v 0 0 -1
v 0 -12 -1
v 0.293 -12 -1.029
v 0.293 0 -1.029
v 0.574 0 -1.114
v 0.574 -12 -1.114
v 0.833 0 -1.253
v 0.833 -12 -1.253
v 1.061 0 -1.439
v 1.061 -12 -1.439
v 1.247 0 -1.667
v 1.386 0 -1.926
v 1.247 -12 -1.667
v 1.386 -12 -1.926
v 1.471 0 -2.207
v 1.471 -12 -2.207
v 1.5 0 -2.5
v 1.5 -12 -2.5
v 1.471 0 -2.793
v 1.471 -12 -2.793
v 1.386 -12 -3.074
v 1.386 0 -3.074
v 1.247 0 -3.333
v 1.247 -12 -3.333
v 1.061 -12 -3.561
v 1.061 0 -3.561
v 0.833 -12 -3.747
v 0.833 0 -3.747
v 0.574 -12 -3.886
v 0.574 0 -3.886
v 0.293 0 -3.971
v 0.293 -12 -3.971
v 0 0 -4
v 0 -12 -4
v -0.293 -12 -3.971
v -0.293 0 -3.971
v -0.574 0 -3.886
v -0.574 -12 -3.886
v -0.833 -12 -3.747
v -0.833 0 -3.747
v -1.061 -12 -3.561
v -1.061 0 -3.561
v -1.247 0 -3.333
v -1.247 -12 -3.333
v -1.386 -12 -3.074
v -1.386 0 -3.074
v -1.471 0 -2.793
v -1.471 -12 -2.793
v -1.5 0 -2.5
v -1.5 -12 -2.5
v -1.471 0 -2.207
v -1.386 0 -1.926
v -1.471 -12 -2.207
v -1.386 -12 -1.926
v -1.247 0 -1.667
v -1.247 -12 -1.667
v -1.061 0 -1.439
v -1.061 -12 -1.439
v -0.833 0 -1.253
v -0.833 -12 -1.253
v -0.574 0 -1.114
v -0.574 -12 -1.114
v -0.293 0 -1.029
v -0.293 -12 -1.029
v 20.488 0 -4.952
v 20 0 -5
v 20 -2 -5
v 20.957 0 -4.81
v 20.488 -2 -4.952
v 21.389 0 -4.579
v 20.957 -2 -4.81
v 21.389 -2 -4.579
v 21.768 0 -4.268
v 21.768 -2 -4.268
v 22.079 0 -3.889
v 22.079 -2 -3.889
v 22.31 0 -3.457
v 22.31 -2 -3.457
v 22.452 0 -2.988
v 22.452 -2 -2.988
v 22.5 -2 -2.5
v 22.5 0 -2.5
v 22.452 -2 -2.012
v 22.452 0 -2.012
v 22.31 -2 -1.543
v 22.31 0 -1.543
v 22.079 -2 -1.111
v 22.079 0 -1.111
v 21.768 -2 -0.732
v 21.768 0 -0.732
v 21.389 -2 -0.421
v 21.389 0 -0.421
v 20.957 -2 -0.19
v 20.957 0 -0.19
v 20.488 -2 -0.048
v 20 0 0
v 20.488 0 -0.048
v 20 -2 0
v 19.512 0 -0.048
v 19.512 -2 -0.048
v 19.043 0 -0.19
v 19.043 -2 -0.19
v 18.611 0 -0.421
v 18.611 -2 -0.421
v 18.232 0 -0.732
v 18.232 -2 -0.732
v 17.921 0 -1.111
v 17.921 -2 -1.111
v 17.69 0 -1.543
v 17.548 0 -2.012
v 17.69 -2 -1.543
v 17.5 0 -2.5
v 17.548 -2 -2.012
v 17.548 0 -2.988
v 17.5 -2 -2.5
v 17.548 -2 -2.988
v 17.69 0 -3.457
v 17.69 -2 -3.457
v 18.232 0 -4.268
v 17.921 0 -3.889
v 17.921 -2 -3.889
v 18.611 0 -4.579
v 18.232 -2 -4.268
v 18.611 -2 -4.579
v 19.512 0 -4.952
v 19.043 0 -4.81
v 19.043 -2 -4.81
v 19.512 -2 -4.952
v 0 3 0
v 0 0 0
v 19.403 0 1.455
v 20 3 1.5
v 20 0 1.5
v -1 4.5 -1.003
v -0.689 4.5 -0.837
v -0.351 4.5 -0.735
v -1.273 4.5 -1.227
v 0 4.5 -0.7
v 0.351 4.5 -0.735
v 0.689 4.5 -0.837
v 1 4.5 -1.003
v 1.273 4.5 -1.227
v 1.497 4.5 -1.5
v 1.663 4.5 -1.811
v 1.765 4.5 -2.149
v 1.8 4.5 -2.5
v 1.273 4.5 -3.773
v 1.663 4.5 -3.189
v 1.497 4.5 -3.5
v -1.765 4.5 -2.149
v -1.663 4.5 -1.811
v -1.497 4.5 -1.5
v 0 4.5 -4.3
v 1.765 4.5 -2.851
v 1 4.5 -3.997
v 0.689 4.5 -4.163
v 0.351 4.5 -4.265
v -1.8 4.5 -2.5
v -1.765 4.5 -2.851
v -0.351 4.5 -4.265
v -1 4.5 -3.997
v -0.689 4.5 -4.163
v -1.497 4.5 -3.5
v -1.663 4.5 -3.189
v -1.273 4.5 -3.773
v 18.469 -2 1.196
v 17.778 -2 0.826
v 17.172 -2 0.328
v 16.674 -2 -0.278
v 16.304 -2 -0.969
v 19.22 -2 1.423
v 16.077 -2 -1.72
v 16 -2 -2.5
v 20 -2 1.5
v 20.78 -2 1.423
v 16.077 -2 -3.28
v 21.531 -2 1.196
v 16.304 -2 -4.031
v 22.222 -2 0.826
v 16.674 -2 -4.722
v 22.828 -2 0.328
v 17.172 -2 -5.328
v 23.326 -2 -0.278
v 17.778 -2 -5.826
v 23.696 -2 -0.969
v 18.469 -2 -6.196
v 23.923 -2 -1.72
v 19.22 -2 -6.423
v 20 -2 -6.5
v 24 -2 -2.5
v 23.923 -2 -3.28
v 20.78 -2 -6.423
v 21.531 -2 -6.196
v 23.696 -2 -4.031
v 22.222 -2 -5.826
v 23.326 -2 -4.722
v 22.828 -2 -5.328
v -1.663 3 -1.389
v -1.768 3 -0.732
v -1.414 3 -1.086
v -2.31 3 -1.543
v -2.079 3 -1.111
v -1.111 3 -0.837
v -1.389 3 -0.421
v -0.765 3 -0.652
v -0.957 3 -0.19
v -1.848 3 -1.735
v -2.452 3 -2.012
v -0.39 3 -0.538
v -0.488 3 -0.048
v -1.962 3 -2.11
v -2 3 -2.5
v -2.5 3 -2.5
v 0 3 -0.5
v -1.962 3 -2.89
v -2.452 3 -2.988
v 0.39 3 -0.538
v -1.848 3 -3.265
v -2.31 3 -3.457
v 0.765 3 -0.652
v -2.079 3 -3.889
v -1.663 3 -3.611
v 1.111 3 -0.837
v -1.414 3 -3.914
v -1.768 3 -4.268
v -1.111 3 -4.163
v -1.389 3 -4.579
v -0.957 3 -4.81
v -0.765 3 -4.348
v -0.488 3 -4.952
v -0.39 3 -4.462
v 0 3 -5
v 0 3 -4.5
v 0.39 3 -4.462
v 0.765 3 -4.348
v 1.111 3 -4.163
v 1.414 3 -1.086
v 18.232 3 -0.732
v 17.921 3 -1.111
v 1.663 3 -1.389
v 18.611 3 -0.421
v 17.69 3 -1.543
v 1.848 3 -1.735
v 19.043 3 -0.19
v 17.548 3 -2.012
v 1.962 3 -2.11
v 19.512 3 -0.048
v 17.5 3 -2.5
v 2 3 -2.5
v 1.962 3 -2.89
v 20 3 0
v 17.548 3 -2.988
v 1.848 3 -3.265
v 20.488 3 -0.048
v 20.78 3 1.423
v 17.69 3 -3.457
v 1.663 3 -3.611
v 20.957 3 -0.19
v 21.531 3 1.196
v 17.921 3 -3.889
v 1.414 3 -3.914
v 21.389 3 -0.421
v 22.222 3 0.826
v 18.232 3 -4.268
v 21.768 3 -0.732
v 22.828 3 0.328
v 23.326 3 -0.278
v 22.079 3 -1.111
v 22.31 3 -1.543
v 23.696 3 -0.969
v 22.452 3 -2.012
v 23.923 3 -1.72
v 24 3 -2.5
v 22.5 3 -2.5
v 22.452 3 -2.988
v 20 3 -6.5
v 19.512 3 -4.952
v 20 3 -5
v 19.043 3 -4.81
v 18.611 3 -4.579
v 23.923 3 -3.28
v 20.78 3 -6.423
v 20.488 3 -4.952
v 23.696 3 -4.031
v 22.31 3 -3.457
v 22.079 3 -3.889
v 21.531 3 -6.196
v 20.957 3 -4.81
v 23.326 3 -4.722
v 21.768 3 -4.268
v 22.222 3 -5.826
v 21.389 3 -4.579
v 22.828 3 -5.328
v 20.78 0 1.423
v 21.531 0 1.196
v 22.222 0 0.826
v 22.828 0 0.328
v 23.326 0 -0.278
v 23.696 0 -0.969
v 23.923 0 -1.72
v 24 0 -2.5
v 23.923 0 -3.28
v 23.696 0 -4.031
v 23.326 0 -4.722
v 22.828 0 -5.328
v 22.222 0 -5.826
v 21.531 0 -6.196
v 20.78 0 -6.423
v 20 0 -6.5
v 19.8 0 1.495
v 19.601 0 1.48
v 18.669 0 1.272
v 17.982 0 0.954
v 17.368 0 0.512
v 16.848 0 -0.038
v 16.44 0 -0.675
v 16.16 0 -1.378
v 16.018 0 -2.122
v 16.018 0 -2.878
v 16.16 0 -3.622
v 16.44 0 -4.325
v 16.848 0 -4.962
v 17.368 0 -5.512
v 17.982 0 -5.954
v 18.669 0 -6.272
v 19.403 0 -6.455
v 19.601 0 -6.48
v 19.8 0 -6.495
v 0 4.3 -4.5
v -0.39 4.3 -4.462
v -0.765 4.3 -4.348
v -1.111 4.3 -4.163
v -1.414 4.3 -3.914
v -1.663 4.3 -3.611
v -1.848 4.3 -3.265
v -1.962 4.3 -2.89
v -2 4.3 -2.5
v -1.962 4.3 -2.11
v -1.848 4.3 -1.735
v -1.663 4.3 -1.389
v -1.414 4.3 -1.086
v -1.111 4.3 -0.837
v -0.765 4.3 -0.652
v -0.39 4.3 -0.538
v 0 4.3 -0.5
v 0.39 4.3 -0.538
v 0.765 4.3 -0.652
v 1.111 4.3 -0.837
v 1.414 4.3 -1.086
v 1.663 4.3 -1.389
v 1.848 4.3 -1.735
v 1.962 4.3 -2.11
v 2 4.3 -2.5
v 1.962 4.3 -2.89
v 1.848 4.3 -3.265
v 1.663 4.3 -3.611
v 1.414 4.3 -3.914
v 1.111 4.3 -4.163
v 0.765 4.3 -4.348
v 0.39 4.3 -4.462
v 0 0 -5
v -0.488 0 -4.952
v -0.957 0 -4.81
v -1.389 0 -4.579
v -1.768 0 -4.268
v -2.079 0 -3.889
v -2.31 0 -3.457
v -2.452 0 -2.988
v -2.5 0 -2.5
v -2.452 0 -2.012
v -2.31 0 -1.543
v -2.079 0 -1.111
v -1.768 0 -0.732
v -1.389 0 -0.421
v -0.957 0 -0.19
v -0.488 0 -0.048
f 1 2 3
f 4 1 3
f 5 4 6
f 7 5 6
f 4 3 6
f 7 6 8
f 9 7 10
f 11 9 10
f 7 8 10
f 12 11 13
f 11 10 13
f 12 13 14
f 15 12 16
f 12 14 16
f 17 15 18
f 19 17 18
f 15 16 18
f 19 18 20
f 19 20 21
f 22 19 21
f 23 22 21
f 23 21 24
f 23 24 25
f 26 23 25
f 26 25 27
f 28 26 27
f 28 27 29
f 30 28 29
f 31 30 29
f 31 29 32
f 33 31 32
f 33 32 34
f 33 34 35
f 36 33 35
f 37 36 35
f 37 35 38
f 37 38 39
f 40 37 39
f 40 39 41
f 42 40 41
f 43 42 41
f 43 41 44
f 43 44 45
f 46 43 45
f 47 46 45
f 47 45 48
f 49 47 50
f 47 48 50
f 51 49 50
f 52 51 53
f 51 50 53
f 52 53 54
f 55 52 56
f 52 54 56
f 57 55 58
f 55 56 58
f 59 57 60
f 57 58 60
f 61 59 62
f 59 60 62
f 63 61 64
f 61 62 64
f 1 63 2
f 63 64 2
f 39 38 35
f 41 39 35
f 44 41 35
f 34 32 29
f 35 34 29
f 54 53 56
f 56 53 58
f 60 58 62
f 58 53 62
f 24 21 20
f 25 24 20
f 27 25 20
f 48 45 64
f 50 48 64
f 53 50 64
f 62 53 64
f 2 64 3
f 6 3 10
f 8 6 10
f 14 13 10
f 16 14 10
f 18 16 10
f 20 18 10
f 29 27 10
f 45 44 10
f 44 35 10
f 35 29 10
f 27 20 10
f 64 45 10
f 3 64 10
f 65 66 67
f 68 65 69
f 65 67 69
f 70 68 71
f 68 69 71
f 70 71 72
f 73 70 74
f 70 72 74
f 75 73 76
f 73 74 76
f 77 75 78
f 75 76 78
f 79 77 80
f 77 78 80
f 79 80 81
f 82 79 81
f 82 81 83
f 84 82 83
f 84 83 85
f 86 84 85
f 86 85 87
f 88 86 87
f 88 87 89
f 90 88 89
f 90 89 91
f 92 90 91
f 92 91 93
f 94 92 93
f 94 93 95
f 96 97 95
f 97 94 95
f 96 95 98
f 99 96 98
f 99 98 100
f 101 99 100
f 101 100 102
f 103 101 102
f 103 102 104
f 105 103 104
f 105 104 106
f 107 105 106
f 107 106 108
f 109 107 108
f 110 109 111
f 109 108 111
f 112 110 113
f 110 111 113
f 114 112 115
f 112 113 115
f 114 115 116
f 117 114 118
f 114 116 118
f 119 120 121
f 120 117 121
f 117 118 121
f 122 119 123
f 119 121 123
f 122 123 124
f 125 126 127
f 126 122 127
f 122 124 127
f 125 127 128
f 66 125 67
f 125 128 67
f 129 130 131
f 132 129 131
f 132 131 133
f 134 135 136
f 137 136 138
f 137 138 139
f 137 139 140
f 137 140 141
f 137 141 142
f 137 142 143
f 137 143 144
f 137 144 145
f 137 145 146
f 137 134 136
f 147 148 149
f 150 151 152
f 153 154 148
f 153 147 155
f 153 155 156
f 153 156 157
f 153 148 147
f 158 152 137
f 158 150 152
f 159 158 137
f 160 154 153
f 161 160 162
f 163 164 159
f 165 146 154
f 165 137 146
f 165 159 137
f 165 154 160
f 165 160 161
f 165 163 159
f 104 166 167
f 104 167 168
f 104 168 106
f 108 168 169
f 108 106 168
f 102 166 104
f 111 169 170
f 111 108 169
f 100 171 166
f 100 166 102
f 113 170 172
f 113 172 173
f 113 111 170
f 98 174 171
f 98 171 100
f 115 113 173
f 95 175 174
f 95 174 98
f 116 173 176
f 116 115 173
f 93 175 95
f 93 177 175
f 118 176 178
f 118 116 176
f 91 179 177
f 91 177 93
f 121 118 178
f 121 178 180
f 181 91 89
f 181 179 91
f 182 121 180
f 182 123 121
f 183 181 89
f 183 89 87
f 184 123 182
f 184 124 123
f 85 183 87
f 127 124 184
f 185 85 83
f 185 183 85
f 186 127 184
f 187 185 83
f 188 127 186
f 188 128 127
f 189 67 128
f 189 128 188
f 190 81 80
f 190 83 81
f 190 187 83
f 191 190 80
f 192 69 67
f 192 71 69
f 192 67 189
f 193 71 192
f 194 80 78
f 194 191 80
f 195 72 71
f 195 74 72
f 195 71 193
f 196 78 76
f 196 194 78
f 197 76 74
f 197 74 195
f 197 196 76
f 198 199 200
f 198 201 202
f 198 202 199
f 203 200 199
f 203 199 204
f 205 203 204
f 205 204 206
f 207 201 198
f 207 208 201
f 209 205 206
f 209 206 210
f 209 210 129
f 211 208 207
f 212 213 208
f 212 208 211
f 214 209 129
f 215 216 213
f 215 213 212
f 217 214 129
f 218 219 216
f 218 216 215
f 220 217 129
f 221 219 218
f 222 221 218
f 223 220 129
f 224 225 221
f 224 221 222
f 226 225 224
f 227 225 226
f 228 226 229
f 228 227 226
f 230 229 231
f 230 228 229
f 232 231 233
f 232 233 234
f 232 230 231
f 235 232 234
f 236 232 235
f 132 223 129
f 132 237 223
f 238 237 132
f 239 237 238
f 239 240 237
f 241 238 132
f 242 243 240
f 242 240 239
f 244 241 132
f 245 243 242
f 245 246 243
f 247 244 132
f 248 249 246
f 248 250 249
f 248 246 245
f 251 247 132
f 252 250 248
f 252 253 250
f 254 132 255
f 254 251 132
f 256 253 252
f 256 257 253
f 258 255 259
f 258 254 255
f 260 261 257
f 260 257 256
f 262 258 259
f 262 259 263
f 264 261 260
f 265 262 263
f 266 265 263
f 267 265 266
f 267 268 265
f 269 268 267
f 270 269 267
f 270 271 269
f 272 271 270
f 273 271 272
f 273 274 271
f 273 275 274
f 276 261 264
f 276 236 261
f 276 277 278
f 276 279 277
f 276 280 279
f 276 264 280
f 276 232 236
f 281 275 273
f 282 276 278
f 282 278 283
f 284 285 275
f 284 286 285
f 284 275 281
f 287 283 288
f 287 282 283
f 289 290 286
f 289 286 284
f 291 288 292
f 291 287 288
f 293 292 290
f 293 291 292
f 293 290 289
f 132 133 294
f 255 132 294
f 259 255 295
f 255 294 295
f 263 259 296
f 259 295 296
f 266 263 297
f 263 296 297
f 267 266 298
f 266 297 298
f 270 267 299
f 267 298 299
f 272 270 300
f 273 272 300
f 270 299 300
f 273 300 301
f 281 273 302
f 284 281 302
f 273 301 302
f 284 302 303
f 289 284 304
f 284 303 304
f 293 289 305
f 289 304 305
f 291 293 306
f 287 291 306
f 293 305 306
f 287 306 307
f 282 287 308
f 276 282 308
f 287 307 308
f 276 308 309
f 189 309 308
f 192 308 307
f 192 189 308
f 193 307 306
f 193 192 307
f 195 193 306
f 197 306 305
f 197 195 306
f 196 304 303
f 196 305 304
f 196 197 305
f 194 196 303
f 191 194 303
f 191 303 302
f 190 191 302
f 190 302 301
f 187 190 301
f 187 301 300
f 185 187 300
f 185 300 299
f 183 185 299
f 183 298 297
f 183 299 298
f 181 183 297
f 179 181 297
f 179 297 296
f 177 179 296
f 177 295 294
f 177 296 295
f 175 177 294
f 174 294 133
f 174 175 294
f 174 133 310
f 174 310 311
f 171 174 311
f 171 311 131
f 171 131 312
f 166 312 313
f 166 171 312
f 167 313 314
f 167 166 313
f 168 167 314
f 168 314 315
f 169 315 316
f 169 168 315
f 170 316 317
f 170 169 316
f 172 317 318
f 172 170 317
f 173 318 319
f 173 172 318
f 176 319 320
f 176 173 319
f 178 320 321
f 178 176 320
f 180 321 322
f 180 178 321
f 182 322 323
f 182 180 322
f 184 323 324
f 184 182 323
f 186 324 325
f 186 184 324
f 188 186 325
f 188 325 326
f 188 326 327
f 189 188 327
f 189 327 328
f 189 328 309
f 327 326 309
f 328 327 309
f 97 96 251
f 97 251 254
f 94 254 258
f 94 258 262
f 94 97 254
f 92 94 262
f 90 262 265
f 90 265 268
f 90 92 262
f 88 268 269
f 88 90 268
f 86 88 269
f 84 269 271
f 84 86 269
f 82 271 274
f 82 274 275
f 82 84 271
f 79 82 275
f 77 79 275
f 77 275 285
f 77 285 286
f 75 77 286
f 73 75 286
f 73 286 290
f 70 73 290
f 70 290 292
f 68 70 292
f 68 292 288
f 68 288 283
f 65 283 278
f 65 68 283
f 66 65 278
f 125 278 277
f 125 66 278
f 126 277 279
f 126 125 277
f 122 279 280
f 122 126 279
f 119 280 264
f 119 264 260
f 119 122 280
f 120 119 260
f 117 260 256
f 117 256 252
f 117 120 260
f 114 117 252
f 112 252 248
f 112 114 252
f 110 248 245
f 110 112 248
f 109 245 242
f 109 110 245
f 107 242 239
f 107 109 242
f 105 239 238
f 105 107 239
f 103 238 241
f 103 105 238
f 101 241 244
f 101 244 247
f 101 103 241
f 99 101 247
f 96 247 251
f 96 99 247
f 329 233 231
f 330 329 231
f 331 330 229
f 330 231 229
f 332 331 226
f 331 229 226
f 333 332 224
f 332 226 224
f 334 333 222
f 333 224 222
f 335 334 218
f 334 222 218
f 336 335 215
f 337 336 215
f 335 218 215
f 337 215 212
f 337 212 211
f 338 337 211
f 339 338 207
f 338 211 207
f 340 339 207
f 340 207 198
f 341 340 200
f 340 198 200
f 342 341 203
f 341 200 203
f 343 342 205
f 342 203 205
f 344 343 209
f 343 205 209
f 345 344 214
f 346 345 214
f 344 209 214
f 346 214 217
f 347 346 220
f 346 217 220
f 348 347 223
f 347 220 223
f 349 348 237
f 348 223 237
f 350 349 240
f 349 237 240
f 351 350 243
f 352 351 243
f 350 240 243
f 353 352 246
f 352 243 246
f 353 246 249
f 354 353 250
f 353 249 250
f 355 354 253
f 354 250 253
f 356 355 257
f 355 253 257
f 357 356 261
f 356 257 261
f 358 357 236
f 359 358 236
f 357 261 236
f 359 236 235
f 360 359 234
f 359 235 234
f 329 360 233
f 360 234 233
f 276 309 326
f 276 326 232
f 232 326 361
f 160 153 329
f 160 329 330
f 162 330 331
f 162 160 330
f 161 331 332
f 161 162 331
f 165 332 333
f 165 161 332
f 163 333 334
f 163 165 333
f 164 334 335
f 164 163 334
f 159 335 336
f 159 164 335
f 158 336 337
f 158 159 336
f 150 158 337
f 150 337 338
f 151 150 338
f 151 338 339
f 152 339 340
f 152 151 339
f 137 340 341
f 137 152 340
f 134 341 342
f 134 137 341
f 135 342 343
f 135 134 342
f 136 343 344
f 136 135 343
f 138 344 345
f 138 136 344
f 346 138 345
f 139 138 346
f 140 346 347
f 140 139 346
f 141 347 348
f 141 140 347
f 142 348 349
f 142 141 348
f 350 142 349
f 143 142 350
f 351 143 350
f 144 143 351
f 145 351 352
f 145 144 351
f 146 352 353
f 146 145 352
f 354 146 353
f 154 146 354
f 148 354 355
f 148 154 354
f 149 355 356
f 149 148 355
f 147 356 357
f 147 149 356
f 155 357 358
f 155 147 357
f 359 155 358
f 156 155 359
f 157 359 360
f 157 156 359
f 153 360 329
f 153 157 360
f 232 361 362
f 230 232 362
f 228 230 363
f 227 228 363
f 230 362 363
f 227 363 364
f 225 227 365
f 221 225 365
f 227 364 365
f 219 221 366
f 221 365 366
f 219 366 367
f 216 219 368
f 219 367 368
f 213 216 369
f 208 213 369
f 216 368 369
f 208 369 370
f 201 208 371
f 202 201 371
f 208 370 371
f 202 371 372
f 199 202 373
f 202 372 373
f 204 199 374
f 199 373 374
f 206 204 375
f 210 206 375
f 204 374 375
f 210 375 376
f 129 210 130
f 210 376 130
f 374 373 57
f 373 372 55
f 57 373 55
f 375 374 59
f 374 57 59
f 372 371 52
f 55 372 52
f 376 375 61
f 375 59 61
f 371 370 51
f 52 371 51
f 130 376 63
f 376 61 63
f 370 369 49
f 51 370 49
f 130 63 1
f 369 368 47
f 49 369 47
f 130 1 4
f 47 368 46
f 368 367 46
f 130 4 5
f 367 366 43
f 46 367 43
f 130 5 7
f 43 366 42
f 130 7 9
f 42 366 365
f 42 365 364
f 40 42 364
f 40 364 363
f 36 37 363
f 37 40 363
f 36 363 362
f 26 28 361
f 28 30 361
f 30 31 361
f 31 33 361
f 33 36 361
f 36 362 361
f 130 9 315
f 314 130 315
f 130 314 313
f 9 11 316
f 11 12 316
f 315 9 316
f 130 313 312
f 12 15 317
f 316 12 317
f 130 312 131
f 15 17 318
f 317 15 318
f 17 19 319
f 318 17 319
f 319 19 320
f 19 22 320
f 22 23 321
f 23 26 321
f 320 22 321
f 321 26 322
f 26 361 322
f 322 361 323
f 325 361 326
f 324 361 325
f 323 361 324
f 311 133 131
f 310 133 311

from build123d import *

# Parameters (mm, degrees)
SKETCH3_R           = 1.5
SKETCH3_R_2         = 2.5
BOSS_EXTRUDE1_DEPTH = 3
BOSS_EXTRUDE2_START = 2
SKETCH4_R           = 4
SKETCH4_R_2         = 2.5
BOSS_EXTRUDE2_DEPTH = 2
BOSS_EXTRUDE3_START = -15
SKETCH5_R           = 1.5
BOSS_EXTRUDE3_DEPTH = 15
SKETCH6_R           = 2
BOSS_EXTRUDE4_DEPTH = 1.5
CHAMFER1_SIZE       = 0.2


with BuildPart() as part:
    # Sketch3 → Boss-Extrude1 (new body)
    with BuildSketch(Plane(origin=(0, 0, 0), x_dir=(1, 0, 0), z_dir=(0, 1, 0))):
        with BuildLine():
            Line((0, 0), (20, -1.5))
            ThreePointArc((20, -1.5), (24, 2.5), (20, 6.5))
            Line((20, 6.5), (0, 5))
            ThreePointArc((0, 5), (-2.5, 2.5), (0, 0))
        make_face()
        with Locations((0, 2.5)):
            Circle(SKETCH3_R, mode=Mode.SUBTRACT)
        with Locations((20, 2.5)):
            Circle(SKETCH3_R_2, mode=Mode.SUBTRACT)
    extrude(amount=BOSS_EXTRUDE1_DEPTH)

    # Sketch4 → Boss-Extrude2 (add)
    with BuildSketch(Plane.XZ.offset(BOSS_EXTRUDE2_START)):
        with Locations((20, -2.5)):
            Circle(SKETCH4_R)
        with Locations((20, -2.5)):
            Circle(SKETCH4_R_2, mode=Mode.SUBTRACT)
    extrude(amount=-BOSS_EXTRUDE2_DEPTH)

    # Sketch5 → Boss-Extrude3 (add)
    with BuildSketch(Plane(origin=(0, 3, 0), x_dir=(1, 0, 0), z_dir=(0, 1, 0)).offset(BOSS_EXTRUDE3_START)):
        with Locations((0, 2.5)):
            Circle(SKETCH5_R)
    extrude(amount=BOSS_EXTRUDE3_DEPTH)

    # Sketch6 → Boss-Extrude4 (add)
    with BuildSketch(Plane(origin=(0, 3, 0), x_dir=(1, 0, 0), z_dir=(0, 1, 0))):
        with Locations((0, 2.5)):
            Circle(SKETCH6_R)
    extrude(amount=BOSS_EXTRUDE4_DEPTH)

    # Chamfer1
    chamfer1_edges = [part.edges().sort_by_distance(p)[0] for p in [
        (-2, 4.5, -2.5),
    ]]
    chamfer(chamfer1_edges, length=CHAMFER1_SIZE)


solid = part.part
